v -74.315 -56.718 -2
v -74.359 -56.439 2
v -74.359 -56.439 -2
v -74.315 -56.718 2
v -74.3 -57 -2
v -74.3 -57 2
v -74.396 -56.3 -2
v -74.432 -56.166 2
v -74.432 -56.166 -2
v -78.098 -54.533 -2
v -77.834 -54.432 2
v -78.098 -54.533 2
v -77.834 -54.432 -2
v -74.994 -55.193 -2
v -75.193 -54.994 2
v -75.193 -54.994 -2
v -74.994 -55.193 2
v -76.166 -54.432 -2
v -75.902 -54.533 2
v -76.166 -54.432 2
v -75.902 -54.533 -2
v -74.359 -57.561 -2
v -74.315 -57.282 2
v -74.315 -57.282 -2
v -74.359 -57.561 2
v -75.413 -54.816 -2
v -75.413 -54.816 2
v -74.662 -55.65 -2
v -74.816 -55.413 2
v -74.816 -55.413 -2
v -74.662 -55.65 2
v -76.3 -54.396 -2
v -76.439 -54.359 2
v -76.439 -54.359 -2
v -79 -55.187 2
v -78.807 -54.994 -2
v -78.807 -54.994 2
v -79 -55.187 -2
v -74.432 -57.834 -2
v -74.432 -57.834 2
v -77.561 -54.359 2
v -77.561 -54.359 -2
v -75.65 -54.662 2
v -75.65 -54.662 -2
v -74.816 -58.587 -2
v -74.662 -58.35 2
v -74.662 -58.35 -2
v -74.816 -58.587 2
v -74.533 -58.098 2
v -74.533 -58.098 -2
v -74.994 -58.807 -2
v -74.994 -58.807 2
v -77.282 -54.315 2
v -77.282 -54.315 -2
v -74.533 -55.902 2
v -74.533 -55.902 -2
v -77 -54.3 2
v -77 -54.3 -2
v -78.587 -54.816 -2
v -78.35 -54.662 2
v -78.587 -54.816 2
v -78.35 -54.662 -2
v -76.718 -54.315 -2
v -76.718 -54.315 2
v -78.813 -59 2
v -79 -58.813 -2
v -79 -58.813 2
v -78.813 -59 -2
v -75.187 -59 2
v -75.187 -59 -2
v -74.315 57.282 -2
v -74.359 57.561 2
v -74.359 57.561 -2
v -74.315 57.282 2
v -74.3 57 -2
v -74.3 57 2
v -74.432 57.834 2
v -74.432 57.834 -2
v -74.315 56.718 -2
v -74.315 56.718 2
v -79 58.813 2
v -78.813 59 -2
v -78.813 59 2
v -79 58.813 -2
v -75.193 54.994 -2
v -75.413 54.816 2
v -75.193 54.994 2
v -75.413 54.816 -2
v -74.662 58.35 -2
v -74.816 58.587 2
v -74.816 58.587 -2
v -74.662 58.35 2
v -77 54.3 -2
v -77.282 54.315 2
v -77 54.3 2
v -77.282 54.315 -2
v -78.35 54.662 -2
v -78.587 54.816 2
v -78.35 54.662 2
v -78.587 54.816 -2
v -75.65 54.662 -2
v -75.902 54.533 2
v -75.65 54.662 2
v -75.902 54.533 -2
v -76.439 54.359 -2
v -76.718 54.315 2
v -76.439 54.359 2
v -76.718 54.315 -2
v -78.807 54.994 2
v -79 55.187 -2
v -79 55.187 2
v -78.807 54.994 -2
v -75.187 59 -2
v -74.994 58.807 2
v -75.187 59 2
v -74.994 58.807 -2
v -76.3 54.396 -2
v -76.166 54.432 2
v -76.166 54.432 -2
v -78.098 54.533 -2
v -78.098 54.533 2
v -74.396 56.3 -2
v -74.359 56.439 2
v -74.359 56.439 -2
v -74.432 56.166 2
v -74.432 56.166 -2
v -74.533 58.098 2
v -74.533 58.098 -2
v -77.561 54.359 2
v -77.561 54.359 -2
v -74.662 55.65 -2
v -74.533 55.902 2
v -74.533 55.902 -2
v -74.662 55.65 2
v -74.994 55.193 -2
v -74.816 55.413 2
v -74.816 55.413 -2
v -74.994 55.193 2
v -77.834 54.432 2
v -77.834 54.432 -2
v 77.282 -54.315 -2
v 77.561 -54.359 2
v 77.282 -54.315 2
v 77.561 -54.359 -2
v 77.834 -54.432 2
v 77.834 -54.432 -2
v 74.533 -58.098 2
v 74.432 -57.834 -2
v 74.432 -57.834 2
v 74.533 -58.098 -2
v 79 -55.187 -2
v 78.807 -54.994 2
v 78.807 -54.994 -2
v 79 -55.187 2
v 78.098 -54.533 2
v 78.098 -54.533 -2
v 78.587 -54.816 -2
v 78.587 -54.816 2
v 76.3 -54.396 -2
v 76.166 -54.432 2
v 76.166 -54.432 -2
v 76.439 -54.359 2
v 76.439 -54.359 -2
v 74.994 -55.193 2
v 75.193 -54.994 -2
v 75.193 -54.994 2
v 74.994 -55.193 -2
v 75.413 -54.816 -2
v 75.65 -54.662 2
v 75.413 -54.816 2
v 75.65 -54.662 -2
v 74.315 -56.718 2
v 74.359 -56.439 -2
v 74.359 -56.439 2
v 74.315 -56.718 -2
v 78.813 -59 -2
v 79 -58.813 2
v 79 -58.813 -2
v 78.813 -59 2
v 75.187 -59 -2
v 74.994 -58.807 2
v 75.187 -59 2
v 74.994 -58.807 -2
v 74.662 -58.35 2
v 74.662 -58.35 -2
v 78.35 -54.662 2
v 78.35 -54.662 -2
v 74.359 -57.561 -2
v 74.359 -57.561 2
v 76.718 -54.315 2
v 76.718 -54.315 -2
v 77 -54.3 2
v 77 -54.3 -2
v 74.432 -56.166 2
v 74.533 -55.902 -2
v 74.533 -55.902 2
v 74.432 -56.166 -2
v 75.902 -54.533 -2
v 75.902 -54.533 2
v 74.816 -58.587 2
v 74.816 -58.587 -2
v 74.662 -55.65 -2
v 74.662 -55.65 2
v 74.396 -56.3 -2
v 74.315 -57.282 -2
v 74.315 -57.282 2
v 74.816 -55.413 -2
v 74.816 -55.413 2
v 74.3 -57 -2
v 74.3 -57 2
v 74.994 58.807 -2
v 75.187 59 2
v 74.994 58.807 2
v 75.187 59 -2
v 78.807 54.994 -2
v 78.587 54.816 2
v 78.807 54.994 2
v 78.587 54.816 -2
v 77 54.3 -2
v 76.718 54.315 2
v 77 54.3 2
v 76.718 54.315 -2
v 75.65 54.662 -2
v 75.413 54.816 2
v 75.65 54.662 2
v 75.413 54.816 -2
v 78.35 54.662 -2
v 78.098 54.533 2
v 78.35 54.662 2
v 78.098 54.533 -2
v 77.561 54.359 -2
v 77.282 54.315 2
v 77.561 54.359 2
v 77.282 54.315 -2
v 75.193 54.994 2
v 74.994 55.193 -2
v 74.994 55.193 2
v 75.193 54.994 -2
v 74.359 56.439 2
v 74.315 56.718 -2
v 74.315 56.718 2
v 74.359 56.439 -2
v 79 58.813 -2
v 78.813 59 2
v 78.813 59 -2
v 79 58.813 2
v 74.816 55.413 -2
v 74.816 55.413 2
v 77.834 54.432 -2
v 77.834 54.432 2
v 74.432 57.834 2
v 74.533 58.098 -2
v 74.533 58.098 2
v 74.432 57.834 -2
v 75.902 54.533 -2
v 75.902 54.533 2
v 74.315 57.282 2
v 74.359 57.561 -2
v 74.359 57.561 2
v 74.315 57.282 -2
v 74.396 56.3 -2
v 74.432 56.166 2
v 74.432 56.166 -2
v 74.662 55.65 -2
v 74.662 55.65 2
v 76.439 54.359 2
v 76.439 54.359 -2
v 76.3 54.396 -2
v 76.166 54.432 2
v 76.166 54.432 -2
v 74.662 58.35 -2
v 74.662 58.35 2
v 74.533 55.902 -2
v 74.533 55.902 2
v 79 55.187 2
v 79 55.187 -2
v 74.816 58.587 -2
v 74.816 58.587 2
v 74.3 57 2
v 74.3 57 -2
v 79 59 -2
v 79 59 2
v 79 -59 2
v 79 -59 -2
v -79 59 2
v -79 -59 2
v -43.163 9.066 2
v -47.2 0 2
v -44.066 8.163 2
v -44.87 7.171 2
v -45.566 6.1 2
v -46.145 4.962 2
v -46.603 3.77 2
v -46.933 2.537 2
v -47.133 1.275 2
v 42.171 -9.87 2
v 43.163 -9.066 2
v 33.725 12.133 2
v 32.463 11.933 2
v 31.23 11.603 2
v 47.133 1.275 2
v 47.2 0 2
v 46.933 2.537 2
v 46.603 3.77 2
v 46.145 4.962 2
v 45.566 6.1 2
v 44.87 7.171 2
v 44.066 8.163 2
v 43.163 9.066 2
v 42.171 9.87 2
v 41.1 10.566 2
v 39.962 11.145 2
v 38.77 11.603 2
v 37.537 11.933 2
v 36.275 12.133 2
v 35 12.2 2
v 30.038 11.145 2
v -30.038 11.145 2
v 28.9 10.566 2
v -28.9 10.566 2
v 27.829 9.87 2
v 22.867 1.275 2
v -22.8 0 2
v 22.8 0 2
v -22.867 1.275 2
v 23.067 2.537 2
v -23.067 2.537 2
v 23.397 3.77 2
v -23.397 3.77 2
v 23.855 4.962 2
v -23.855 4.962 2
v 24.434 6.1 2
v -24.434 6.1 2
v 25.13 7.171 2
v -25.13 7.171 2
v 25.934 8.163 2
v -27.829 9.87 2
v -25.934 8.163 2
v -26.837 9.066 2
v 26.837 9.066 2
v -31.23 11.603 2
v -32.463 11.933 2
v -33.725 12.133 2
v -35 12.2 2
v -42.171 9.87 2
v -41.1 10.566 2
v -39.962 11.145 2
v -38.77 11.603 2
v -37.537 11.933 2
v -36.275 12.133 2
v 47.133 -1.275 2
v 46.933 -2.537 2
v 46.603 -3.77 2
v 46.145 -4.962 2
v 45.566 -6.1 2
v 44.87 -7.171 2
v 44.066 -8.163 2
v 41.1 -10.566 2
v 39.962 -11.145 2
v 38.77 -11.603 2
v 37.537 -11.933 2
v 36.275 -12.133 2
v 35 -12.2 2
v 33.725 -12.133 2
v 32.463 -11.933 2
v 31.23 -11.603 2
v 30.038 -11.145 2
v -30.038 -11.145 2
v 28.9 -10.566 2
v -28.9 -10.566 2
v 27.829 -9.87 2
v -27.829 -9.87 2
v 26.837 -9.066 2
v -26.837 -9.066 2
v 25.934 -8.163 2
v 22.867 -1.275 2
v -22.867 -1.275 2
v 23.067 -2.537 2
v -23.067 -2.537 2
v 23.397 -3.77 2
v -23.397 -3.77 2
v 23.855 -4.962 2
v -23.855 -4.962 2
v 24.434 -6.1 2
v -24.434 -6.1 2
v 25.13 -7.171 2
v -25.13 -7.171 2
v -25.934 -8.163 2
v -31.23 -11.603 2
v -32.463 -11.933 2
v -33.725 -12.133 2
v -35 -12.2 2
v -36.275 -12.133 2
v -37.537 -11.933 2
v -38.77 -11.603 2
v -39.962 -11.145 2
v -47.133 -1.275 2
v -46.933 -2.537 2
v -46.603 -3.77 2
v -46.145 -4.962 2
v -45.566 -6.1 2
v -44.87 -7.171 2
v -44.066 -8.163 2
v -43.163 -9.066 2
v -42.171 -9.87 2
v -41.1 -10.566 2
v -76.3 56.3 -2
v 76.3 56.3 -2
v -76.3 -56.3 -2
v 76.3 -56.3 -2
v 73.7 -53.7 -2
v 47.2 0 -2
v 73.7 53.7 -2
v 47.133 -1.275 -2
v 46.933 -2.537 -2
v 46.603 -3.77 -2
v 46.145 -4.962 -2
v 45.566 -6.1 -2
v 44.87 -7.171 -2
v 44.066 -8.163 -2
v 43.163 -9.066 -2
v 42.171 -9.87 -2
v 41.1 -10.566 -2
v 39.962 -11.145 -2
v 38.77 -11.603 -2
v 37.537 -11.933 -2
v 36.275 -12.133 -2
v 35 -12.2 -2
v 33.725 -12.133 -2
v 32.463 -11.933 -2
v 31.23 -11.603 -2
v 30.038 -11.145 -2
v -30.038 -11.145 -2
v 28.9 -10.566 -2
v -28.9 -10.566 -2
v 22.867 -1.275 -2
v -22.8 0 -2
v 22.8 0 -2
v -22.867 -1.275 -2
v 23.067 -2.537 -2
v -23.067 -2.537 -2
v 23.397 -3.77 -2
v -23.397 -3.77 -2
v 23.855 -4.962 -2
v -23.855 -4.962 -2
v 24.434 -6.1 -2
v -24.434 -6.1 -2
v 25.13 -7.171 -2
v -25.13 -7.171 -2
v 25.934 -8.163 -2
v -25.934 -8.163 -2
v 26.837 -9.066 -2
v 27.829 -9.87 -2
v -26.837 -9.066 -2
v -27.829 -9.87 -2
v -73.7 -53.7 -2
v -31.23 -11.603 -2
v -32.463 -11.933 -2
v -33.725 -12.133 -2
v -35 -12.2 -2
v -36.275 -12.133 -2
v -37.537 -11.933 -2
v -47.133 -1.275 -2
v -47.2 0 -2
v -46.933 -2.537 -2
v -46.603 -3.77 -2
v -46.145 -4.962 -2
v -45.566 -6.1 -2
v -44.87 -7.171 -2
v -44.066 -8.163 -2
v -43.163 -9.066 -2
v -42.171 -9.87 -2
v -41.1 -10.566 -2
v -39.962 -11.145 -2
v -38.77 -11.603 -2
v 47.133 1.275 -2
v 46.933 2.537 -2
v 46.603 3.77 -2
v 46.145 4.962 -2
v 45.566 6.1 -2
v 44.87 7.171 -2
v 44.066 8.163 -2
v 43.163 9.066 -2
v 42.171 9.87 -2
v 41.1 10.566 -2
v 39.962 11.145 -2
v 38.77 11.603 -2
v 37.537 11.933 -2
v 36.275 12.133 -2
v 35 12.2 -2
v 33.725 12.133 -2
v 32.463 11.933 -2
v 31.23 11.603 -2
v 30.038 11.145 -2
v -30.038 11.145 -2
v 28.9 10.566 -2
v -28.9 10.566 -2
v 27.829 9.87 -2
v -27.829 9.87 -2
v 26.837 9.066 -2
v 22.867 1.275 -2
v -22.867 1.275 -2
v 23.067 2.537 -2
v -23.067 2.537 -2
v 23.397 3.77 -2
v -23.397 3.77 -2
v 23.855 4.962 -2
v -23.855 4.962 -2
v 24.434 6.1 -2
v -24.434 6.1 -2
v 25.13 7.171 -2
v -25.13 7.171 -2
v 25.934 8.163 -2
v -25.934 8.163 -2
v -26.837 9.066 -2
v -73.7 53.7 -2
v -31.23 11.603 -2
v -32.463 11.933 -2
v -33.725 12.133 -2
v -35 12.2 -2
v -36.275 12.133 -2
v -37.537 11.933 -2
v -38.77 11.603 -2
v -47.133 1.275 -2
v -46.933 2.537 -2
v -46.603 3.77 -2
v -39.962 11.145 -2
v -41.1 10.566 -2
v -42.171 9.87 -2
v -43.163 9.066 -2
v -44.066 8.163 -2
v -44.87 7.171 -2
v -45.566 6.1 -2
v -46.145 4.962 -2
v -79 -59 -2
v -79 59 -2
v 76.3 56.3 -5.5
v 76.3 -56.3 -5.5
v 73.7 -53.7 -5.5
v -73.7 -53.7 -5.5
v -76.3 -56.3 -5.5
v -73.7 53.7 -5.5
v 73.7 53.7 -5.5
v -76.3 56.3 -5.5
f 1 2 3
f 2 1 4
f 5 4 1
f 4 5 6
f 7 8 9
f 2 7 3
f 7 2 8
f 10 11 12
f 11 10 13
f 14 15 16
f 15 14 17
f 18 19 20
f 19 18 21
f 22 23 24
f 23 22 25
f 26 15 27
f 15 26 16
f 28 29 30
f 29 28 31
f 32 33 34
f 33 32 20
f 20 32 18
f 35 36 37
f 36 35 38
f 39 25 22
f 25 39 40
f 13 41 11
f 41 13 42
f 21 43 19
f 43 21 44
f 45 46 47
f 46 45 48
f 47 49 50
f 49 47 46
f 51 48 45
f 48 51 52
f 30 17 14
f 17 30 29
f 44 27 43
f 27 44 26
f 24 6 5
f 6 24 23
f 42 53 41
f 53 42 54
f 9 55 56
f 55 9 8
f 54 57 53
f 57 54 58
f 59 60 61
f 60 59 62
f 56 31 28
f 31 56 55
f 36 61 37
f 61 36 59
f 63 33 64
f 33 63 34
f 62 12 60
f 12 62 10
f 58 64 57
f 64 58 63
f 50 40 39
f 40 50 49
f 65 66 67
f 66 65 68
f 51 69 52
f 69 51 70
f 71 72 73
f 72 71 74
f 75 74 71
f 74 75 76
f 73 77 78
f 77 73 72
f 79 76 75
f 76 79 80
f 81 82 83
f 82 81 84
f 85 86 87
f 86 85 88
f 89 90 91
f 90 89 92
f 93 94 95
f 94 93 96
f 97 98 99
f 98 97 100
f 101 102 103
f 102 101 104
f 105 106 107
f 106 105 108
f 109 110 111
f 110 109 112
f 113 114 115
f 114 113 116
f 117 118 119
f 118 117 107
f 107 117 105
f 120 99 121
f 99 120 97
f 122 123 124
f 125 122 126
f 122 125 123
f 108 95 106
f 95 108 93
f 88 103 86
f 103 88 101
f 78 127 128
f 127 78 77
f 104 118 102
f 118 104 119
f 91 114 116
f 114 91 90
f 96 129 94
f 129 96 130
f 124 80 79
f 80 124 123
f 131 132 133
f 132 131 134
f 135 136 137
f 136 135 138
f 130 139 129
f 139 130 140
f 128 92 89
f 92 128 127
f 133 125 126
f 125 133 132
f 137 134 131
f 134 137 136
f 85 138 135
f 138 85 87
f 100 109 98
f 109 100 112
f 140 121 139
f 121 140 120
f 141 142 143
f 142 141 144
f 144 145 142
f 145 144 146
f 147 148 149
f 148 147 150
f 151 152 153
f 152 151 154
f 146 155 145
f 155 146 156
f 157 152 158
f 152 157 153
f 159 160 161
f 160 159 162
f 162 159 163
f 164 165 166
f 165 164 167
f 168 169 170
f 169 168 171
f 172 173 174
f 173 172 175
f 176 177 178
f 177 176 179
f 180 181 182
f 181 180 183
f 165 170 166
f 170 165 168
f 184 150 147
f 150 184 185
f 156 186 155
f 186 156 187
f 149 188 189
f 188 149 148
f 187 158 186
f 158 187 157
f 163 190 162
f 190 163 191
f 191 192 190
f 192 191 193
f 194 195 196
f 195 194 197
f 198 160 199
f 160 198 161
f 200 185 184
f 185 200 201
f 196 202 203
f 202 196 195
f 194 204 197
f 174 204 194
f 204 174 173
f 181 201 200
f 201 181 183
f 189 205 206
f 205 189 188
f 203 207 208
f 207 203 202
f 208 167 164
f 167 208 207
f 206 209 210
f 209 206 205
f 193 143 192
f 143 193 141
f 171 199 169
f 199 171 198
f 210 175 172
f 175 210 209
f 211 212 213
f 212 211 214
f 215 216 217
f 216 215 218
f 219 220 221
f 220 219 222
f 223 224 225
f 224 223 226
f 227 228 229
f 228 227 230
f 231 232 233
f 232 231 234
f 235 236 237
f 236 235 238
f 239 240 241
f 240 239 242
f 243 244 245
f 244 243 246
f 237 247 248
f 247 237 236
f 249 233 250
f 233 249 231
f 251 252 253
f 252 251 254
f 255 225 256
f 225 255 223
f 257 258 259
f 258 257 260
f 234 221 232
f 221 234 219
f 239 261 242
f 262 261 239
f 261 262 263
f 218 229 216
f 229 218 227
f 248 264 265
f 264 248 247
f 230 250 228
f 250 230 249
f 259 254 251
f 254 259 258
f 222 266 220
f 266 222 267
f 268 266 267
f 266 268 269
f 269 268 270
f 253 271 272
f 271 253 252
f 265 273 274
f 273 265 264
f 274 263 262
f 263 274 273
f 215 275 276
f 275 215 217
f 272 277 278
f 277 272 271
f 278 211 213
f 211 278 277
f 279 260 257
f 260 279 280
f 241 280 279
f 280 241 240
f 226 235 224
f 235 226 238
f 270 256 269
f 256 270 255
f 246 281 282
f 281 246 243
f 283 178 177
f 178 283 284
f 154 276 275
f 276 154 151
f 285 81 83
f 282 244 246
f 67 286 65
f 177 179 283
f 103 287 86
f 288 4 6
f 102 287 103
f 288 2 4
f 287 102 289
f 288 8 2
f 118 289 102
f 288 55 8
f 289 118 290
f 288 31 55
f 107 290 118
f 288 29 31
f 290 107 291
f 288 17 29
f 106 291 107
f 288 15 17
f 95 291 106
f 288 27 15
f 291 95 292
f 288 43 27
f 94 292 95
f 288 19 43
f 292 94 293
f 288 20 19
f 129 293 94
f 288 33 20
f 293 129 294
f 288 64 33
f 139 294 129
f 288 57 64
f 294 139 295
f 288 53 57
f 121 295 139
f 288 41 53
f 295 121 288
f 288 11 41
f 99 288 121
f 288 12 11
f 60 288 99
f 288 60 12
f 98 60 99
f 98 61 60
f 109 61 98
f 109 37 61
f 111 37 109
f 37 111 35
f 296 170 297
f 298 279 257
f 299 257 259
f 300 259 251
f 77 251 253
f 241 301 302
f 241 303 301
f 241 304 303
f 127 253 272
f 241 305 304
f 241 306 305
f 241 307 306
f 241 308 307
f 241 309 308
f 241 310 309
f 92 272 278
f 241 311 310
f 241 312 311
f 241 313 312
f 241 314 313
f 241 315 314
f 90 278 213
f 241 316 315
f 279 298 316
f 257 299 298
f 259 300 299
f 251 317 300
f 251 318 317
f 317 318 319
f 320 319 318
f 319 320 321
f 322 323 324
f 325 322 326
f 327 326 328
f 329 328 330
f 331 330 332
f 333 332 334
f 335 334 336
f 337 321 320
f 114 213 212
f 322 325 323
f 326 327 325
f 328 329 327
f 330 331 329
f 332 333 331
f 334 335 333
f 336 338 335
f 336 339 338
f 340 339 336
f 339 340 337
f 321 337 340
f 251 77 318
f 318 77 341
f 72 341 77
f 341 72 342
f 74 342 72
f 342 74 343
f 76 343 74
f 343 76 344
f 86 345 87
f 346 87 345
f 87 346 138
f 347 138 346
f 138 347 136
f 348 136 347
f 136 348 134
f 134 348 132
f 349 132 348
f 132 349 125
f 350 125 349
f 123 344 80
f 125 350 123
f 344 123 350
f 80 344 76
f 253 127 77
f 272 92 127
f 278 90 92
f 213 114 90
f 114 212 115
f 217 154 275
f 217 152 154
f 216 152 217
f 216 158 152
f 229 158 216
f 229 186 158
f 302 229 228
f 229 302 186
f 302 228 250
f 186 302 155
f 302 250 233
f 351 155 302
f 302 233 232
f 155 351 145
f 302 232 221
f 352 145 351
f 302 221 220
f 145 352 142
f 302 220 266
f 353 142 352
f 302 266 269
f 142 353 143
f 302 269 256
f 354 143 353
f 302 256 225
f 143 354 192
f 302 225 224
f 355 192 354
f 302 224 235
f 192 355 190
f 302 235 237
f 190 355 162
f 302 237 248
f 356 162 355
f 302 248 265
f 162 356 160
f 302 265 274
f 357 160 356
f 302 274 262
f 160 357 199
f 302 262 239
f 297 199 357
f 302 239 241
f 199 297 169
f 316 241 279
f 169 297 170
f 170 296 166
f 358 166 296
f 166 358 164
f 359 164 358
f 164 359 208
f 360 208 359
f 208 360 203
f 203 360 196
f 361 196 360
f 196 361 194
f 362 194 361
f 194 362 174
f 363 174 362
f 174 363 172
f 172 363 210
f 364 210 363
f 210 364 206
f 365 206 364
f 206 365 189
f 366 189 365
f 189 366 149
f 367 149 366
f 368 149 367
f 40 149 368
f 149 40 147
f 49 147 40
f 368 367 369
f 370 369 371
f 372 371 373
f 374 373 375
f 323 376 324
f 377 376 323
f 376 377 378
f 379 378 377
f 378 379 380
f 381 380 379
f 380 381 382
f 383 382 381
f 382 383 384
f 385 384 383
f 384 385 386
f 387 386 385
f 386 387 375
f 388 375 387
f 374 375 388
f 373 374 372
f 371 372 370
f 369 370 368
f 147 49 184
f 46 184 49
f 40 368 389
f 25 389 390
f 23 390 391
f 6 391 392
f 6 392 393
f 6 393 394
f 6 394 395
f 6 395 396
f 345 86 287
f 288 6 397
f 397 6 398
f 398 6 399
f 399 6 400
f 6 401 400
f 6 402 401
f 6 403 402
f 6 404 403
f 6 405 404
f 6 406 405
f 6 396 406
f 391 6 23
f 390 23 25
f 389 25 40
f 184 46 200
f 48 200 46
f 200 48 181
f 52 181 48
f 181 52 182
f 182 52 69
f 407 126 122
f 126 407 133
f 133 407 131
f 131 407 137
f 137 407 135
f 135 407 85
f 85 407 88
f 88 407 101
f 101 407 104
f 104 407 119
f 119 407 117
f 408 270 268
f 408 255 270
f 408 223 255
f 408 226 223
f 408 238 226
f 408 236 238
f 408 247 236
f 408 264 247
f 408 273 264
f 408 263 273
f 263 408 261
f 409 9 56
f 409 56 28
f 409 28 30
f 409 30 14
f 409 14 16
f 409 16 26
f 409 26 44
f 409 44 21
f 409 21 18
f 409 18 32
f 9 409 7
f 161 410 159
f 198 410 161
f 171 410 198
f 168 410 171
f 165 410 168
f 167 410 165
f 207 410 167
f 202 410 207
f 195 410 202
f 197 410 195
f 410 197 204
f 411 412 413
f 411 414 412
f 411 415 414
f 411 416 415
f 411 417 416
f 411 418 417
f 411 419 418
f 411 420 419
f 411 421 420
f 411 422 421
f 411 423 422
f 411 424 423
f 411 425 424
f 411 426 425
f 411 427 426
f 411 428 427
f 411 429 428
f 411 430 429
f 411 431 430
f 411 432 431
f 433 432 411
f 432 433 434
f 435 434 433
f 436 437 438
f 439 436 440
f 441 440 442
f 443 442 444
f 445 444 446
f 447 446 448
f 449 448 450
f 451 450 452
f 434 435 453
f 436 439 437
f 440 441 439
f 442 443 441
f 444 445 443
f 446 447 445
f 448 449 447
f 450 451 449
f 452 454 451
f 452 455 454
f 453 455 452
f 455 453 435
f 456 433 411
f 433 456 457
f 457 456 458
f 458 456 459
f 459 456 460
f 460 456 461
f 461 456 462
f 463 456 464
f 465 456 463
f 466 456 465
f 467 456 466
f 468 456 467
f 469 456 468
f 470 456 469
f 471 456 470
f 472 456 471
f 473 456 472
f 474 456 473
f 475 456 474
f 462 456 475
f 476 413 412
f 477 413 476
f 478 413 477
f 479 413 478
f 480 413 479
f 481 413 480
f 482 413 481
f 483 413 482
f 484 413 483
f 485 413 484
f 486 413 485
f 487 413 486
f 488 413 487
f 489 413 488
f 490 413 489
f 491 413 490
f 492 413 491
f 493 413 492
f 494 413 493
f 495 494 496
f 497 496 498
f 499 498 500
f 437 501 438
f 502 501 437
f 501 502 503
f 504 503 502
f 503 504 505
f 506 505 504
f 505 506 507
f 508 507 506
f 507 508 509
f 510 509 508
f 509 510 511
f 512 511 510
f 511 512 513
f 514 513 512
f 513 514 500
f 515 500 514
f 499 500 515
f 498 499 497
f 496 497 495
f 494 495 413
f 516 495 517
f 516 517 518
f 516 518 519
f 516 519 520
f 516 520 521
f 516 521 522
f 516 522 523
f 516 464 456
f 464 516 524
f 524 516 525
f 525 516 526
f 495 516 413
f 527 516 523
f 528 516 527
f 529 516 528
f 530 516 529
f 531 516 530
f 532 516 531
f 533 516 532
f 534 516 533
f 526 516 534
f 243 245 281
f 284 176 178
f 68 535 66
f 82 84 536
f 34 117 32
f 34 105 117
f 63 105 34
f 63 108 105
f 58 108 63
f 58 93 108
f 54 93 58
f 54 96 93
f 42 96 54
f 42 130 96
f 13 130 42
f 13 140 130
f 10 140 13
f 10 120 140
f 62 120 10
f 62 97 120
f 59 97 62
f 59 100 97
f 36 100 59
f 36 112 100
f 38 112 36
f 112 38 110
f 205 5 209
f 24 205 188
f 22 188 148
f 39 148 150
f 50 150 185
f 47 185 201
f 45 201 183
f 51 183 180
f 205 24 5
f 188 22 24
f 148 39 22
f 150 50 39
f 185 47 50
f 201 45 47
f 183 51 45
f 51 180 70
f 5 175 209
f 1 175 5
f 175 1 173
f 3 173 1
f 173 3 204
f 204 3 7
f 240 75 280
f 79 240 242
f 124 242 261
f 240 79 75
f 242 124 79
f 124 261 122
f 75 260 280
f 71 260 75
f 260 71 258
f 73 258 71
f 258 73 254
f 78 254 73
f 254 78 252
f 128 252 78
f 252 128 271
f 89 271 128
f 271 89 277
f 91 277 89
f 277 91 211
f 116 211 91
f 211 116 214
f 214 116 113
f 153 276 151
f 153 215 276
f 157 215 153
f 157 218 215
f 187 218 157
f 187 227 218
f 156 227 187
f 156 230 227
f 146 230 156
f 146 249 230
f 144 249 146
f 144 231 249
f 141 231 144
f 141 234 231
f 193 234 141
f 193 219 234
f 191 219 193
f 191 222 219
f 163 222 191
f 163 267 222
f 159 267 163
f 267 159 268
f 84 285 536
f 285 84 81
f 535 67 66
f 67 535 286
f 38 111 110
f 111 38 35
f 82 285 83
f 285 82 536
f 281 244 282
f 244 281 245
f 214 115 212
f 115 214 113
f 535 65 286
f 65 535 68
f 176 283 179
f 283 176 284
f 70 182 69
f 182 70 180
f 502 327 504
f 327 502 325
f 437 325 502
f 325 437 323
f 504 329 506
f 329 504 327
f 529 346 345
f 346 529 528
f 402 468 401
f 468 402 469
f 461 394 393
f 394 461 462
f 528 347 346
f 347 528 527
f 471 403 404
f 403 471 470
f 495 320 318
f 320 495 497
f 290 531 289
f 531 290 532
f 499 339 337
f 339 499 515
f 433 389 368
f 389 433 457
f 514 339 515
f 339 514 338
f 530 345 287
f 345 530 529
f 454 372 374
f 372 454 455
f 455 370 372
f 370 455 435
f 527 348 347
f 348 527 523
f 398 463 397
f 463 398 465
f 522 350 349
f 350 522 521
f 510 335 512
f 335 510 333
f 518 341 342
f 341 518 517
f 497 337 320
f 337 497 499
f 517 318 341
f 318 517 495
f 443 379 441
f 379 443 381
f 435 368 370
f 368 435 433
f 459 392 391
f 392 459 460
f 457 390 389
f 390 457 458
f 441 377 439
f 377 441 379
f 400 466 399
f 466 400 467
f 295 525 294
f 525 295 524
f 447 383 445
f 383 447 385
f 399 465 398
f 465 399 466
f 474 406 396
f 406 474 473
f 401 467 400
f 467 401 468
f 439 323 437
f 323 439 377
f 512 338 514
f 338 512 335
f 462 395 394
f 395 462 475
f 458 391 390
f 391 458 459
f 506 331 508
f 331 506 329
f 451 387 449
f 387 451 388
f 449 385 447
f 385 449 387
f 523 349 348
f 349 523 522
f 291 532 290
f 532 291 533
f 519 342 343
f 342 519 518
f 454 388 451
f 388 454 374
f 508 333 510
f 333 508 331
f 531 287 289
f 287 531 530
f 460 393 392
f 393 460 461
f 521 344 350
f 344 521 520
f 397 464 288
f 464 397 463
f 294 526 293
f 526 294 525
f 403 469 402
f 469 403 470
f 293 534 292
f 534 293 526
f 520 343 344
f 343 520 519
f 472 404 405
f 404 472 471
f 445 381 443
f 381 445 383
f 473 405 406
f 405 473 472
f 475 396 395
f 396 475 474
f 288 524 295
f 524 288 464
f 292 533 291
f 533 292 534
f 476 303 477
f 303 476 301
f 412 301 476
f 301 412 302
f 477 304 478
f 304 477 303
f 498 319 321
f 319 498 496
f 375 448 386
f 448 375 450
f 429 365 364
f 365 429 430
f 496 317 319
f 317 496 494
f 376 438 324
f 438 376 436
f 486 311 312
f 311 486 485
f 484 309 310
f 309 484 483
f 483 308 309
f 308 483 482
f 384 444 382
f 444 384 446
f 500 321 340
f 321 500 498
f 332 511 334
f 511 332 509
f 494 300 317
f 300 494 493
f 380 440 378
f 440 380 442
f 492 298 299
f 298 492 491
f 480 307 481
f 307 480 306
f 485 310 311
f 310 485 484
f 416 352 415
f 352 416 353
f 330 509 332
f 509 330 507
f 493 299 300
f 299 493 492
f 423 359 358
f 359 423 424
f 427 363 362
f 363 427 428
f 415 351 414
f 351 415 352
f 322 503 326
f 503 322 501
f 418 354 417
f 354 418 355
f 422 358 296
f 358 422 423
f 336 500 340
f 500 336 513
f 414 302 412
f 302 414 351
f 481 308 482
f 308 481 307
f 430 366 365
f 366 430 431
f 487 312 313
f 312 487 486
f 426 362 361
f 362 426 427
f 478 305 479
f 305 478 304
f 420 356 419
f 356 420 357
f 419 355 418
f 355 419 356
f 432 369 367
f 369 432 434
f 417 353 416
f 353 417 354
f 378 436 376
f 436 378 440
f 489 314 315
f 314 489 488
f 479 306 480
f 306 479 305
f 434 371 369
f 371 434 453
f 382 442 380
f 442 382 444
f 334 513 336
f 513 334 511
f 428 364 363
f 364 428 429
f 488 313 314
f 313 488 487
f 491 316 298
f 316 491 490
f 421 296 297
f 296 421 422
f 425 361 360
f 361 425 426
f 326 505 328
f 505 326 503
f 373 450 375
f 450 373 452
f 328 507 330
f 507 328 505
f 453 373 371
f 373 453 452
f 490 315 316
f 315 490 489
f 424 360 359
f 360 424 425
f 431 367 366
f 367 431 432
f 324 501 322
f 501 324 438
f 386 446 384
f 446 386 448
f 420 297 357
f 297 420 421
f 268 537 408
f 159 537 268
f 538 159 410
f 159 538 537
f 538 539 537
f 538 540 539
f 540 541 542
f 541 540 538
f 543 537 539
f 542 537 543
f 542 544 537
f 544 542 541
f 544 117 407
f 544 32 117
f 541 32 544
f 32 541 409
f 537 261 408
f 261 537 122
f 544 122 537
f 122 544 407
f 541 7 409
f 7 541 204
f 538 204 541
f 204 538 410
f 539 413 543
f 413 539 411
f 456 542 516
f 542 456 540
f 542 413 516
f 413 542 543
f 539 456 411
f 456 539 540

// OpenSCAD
// UNIVAC IX Smart Farm Mechanical Layer: Weatherproof Bolt-Down Lid
// Integrates an inverted compression ridge and panels for circular twist-lock connectors

$fn = 60;
box_w = 110;
box_l = 150;
wall_t = 4;
gasket_w = 2.6; // Slightly narrower than groove for dynamic friction fit
gasket_h = 3.5; // Extrudes down into the base track

module bolt_down_lid() {
    union() {
        // Main structural top plate
        difference() {
            cube([box_l + (wall_t * 2), box_w + (wall_t * 2), wall_t], center=true);
            
            // 4x Perimeter structural bolt clearance channels (M5 clear)
            for(x = [-(box_l/2) - 2, (box_l/2) + 2]) {
                for(y = [-(box_w/2) - 2, (box_w/2) + 2]) {
                    translate([x, y, 0]) cylinder(h=wall_t + 2, r=2.7, center=true);
                }
            }
            
            // Cutouts for Flush-Mounted Circular Twist-Lock Connectors (e.g., Amphenol/MIL-SPEC)
            translate([-35, 0, 0]) cylinder(h=wall_t + 2, r=12.2, center=true); // Main Twist-Lock Bus A
            translate([35, 0, 0]) cylinder(h=wall_t + 2, r=12.2, center=true);  // Main Twist-Lock Bus B
        }
        
        // Inverted Compression Ridge (Extrudes downwards into the base groove)
        translate([0, 0, -(wall_t/2) - (gasket_h/2)]) {
            difference() {
                cube([box_l + gasket_w, box_w + gasket_w, gasket_h], center=true);
                cube([box_l - gasket_w, box_w - gasket_w, gasket_h + 1], center=true);
            }
        }
    }
}

// Render the top enclosure lid interface
color("DimGray") bolt_down_lid();
